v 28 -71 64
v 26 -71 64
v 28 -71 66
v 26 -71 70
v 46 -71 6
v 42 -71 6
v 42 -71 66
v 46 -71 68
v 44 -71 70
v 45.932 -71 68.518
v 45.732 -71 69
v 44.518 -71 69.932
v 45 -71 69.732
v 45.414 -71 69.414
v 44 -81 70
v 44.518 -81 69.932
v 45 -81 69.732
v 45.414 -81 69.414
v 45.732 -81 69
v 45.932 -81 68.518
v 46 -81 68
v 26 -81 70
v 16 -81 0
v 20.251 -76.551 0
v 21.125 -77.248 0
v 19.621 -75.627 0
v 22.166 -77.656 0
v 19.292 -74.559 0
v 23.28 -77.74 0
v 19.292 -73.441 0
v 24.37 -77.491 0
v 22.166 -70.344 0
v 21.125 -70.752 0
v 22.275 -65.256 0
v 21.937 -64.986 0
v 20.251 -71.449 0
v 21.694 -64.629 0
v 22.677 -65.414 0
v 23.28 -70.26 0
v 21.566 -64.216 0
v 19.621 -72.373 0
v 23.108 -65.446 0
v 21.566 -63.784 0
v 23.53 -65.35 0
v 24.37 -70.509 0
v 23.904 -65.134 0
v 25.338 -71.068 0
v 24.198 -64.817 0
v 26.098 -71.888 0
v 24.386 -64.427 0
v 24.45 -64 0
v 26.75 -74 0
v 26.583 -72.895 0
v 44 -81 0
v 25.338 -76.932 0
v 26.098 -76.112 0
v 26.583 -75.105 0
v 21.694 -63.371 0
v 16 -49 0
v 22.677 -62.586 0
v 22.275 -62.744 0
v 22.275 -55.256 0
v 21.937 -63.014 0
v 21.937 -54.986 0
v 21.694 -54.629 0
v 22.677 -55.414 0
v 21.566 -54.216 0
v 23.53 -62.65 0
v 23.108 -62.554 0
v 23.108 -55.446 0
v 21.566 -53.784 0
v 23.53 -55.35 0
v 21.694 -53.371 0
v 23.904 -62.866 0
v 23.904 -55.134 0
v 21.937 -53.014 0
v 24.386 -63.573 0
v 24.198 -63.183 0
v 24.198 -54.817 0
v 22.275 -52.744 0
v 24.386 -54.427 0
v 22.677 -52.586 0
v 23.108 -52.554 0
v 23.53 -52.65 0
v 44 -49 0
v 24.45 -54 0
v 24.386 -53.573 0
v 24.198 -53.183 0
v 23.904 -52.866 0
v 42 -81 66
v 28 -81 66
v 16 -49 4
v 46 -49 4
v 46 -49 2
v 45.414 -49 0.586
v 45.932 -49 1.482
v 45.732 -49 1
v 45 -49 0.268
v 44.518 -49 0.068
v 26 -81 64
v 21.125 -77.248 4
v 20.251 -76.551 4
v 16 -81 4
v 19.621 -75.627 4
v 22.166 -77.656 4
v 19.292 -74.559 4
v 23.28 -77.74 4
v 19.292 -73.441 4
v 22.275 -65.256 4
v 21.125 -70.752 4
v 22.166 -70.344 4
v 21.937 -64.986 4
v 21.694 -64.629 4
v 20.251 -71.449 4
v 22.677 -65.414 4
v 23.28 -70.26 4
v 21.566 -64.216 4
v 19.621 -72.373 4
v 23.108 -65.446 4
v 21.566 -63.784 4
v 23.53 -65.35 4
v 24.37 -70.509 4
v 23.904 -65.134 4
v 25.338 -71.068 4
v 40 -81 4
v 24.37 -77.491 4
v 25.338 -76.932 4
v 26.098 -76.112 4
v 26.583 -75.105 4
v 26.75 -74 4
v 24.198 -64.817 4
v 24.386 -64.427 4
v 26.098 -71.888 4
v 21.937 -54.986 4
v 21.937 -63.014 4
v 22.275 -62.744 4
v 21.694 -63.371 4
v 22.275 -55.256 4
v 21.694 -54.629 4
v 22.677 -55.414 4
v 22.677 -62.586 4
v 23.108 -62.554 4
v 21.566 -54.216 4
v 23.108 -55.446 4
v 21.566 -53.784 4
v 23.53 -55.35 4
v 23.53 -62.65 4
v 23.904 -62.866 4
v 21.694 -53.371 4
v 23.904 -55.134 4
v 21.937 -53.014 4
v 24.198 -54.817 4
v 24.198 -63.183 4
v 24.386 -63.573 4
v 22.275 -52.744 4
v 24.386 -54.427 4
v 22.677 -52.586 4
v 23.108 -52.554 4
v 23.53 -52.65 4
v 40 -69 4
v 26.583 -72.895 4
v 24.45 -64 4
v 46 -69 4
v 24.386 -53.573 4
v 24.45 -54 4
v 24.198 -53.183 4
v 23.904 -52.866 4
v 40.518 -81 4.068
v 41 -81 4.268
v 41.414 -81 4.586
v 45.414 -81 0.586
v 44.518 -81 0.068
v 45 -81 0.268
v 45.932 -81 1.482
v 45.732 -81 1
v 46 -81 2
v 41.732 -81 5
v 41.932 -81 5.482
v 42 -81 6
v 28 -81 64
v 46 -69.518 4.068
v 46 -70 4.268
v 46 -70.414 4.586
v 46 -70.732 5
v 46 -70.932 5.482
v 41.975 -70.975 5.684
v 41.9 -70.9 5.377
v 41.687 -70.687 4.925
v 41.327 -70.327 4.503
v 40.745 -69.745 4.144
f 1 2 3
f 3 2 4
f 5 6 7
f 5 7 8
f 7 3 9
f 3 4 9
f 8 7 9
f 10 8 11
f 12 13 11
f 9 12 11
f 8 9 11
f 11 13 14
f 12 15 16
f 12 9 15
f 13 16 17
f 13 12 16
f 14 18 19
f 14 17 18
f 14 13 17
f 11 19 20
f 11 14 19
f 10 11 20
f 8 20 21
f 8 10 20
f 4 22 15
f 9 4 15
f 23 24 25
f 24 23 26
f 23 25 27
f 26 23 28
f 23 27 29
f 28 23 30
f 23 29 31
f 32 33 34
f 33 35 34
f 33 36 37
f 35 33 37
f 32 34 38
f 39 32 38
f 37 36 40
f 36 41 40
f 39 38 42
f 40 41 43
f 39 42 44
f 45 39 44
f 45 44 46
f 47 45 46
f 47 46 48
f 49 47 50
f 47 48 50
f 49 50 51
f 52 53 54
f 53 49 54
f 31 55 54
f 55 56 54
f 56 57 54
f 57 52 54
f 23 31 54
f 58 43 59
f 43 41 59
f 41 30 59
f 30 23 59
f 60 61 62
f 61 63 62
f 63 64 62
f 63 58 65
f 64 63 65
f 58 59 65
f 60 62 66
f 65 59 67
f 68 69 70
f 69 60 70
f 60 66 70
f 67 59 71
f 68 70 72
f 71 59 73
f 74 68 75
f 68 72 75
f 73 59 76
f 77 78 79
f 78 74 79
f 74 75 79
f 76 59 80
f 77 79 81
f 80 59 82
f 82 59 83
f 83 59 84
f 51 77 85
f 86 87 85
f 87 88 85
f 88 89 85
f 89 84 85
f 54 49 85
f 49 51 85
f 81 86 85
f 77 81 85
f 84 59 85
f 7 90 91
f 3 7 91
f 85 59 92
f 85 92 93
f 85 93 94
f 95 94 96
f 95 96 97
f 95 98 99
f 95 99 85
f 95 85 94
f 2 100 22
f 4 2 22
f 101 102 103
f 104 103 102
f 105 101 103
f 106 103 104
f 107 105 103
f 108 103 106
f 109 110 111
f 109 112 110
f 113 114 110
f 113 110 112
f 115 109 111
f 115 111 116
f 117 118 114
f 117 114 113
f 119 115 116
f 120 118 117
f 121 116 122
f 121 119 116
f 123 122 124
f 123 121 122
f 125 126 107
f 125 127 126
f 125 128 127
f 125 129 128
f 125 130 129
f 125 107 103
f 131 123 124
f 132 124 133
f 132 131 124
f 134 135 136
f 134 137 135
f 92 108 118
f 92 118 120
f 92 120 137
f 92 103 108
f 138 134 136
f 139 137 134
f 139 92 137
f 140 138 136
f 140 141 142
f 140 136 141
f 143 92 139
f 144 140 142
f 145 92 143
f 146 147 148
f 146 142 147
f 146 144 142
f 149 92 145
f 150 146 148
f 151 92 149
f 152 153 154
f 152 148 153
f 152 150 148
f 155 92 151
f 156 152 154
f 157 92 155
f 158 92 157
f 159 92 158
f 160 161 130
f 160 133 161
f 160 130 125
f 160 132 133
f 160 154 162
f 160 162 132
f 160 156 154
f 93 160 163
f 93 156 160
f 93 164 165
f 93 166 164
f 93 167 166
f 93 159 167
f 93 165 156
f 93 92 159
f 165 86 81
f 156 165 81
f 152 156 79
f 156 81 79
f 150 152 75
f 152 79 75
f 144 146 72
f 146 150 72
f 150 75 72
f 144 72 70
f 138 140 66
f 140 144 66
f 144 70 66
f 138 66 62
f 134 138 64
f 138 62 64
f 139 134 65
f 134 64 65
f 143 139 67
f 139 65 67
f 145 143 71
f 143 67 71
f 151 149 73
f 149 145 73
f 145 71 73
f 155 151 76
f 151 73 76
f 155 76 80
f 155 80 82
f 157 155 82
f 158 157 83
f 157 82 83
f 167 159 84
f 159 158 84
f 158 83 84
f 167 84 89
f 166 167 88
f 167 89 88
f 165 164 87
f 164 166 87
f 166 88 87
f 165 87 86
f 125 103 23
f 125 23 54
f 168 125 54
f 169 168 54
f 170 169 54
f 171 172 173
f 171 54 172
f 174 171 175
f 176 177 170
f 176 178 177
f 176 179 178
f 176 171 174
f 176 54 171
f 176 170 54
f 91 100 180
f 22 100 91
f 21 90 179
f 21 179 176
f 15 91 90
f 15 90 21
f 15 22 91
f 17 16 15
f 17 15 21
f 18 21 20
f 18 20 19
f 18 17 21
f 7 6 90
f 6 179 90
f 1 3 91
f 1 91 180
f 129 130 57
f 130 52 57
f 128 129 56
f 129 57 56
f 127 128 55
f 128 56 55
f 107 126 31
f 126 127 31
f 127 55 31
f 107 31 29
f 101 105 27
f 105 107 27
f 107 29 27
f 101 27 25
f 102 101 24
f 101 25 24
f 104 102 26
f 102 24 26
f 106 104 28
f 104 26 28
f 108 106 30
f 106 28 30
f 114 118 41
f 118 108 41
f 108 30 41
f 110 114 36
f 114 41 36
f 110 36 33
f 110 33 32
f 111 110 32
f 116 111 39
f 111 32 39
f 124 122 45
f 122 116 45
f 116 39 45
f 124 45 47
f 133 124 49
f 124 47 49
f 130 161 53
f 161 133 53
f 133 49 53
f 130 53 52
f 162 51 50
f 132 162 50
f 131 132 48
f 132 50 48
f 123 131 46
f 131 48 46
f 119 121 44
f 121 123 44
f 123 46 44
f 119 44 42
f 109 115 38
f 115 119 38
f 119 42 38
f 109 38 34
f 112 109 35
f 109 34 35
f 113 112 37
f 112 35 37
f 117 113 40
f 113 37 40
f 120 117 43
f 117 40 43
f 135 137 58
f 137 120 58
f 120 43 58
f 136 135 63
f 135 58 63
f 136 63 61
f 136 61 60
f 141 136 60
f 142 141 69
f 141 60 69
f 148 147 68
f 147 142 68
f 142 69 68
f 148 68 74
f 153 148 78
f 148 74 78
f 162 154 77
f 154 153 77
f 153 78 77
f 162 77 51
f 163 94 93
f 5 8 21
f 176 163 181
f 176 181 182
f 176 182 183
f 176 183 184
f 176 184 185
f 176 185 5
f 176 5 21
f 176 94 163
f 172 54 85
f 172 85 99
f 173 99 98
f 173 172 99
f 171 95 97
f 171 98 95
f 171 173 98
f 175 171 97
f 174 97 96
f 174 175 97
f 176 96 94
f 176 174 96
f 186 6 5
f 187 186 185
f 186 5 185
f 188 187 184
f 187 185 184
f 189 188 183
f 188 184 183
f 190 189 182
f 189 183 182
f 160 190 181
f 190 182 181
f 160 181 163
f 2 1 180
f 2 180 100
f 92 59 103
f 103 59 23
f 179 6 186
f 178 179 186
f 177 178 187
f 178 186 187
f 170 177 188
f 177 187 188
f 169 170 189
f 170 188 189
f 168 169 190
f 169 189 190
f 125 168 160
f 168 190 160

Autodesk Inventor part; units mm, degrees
ref_plane "YZ Plane" through (0, 0, 0) normal (1, 0, 0) x (0, 1, 0)
ref_plane "XZ Plane" through (0, 0, 0) normal (0, 1, 0) x (-1, 0, 0)
ref_plane "XY Plane" through (0, 0, 0) normal (0, 0, 1) x (1, 0, 0)
ref_plane "Work Plane1" through (0, 0, 0) normal (0, 0, 1) x (1, 0, 0)
sketch "Sketch1" plane through (0, 0, 0) normal (0, 0, 1) x (1, 0, 0)
  line L0 (-30, -73.2876) -> (-18.6416, -61.9292) projected
  line L1 (-18.6416, -61.9292) -> (-17.5809, -62.9898) projected
  line L2 (-17.5809, -62.9898) -> (-30, -75.4089) projected
  line L3 (-30, -75.4089) -> (-30, -76) projected
  arc A0 (-30, -76) -> (-26, -80) centre (-26, -76) ccw projected
  line L4 (-18, -80) -> (-26, -80) projected
  arc A1 (-18, -80) -> (-14, -76) centre (-18, -76) ccw projected
  line L5 (-14, -34) -> (-14, -76) projected
  arc A2 (-10, -30) -> (-14, -34) centre (-10, -34) ccw projected
  line L6 (-10, -30) -> (12, -30) projected
  arc A3 (16, -34) -> (12, -30) centre (12, -34) ccw projected
  line L7 (16, -34) -> (16, -76) projected
  arc A4 (16, -76) -> (20, -80) centre (20, -76) ccw projected
  line L8 (20, -80) -> (26, -80) projected
  arc A5 (26, -80) -> (30, -76) centre (26, -76) ccw projected
  line L9 (30, 28) -> (30, -76) projected
  line L10 (30, 28) -> (28, 30) projected
  line L11 (28, 30) -> (-28, 30) projected
  line L12 (-28, 30) -> (-30, 28) projected
  line L13 (-30, 28) -> (-30, -73.2876) projected
  circle A6 centre (-10, -25) radius 1.45 projected
  circle A7 centre (-10, 25) radius 1.45 projected
  circle A8 centre (10, 25) radius 1.45 projected
  circle A9 centre (10, -25) radius 1.45 projected
  circle A10 centre (25, -10) radius 1.45 projected
  circle A11 centre (-25, -10) radius 1.45 projected
  circle A12 centre (-25, 10) radius 1.45 projected
  circle A13 centre (25, 10) radius 1.45 projected
  circle A14 centre (-17.5, -17.5) radius 1.95 projected
  circle A15 centre (17.5, 17.5) radius 1.95 projected
  circle A16 centre (17.5, -17.5) radius 1.95 projected
  circle A17 centre (-17.5, 17.5) radius 1.95 projected
  circle A18 centre (-25, 25) radius 2.325 projected
  circle A19 centre (25, -25) radius 2.325 projected
  circle A20 centre (-25, -25) radius 2.325 projected
  circle A21 centre (25, 25) radius 2.325 projected
  circle A22 centre (0, 0) radius 16 projected
  circle A23 centre (23, -74) radius 3.75 projected
  circle A24 centre (23, -64) radius 1.45 projected
  circle A25 centre (23, -54) radius 1.45 projected
  line L14 (16, -49) -> (46, -49)
  line L15 (46, -49) -> (46, -81)
  line L16 (46, -81) -> (16, -81)
  line L17 (16, -81) -> (16, -49)
  point P0 (0, 0)
  dimension "d0" = 30
  dimension "d1" = 32
  dimension "d2" = 5
extrude "Extrusion1" add sketch "Sketch1" along normal blind 4 contours L14 L15 L16 L17 A4 L8 A5 L9 | L9 A5 L8 A4 L7 L14
sketch "Sketch2" plane through (16, -81, 0) normal (0, -1, 0) x (1, 0, 0)
  line L0 (0, 0) -> (30, 0) projected
  line L1 (30, 0) -> (30, 4) projected
  line L2 (0, 4) -> (30, 4) projected
  line L3 (0, 0) -> (0, 4) projected
  line L4 (30, 4) -> (26, 4)
  line L5 (26, 4) -> (26, 66)
  line L6 (26, 66) -> (30, 66)
  line L7 (30, 66) -> (30, 4)
  line L8 (30, 66) -> (10, 66)
  line L9 (10, 66) -> (10, 70)
  line L10 (10, 70) -> (30, 70)
  line L11 (30, 70) -> (30, 66)
  point P0 (-16, 0)
  point P1 (26, 4)
  dimension "d5" = 4
  dimension "d6" = 62
  dimension "d7" = 20
  dimension "d8" = 4
extrude "Extrusion2" add sketch "Sketch2" against normal blind 10 contours L2 L5 L6 L7 | L6 L8 L9 L10 L11
fillet "Fillet1" radius 2 4 edges at (46, -76, 70) (42, -76, 4) (44, -71, 4) (46, -65, 0)
sketch "Sketch3" plane through (16, -81, 0) normal (0, -1, 0) x (1, 0, 0)
  line L0 (10, 66) -> (10, 70) projected
  line L1 (10, 66) -> (12, 66)
  line L2 (12, 66) -> (12, 64)
  line L3 (12, 64) -> (10, 64)
  line L4 (10, 64) -> (10, 66)
  point P0 (-16, 0)
  dimension "d12" = 2
  dimension "d13" = 2
extrude "Extrusion3" add sketch "Sketch3" against normal blind 10
properties part number "30_XY_Sample_lightsheetarm_sample_v3"
